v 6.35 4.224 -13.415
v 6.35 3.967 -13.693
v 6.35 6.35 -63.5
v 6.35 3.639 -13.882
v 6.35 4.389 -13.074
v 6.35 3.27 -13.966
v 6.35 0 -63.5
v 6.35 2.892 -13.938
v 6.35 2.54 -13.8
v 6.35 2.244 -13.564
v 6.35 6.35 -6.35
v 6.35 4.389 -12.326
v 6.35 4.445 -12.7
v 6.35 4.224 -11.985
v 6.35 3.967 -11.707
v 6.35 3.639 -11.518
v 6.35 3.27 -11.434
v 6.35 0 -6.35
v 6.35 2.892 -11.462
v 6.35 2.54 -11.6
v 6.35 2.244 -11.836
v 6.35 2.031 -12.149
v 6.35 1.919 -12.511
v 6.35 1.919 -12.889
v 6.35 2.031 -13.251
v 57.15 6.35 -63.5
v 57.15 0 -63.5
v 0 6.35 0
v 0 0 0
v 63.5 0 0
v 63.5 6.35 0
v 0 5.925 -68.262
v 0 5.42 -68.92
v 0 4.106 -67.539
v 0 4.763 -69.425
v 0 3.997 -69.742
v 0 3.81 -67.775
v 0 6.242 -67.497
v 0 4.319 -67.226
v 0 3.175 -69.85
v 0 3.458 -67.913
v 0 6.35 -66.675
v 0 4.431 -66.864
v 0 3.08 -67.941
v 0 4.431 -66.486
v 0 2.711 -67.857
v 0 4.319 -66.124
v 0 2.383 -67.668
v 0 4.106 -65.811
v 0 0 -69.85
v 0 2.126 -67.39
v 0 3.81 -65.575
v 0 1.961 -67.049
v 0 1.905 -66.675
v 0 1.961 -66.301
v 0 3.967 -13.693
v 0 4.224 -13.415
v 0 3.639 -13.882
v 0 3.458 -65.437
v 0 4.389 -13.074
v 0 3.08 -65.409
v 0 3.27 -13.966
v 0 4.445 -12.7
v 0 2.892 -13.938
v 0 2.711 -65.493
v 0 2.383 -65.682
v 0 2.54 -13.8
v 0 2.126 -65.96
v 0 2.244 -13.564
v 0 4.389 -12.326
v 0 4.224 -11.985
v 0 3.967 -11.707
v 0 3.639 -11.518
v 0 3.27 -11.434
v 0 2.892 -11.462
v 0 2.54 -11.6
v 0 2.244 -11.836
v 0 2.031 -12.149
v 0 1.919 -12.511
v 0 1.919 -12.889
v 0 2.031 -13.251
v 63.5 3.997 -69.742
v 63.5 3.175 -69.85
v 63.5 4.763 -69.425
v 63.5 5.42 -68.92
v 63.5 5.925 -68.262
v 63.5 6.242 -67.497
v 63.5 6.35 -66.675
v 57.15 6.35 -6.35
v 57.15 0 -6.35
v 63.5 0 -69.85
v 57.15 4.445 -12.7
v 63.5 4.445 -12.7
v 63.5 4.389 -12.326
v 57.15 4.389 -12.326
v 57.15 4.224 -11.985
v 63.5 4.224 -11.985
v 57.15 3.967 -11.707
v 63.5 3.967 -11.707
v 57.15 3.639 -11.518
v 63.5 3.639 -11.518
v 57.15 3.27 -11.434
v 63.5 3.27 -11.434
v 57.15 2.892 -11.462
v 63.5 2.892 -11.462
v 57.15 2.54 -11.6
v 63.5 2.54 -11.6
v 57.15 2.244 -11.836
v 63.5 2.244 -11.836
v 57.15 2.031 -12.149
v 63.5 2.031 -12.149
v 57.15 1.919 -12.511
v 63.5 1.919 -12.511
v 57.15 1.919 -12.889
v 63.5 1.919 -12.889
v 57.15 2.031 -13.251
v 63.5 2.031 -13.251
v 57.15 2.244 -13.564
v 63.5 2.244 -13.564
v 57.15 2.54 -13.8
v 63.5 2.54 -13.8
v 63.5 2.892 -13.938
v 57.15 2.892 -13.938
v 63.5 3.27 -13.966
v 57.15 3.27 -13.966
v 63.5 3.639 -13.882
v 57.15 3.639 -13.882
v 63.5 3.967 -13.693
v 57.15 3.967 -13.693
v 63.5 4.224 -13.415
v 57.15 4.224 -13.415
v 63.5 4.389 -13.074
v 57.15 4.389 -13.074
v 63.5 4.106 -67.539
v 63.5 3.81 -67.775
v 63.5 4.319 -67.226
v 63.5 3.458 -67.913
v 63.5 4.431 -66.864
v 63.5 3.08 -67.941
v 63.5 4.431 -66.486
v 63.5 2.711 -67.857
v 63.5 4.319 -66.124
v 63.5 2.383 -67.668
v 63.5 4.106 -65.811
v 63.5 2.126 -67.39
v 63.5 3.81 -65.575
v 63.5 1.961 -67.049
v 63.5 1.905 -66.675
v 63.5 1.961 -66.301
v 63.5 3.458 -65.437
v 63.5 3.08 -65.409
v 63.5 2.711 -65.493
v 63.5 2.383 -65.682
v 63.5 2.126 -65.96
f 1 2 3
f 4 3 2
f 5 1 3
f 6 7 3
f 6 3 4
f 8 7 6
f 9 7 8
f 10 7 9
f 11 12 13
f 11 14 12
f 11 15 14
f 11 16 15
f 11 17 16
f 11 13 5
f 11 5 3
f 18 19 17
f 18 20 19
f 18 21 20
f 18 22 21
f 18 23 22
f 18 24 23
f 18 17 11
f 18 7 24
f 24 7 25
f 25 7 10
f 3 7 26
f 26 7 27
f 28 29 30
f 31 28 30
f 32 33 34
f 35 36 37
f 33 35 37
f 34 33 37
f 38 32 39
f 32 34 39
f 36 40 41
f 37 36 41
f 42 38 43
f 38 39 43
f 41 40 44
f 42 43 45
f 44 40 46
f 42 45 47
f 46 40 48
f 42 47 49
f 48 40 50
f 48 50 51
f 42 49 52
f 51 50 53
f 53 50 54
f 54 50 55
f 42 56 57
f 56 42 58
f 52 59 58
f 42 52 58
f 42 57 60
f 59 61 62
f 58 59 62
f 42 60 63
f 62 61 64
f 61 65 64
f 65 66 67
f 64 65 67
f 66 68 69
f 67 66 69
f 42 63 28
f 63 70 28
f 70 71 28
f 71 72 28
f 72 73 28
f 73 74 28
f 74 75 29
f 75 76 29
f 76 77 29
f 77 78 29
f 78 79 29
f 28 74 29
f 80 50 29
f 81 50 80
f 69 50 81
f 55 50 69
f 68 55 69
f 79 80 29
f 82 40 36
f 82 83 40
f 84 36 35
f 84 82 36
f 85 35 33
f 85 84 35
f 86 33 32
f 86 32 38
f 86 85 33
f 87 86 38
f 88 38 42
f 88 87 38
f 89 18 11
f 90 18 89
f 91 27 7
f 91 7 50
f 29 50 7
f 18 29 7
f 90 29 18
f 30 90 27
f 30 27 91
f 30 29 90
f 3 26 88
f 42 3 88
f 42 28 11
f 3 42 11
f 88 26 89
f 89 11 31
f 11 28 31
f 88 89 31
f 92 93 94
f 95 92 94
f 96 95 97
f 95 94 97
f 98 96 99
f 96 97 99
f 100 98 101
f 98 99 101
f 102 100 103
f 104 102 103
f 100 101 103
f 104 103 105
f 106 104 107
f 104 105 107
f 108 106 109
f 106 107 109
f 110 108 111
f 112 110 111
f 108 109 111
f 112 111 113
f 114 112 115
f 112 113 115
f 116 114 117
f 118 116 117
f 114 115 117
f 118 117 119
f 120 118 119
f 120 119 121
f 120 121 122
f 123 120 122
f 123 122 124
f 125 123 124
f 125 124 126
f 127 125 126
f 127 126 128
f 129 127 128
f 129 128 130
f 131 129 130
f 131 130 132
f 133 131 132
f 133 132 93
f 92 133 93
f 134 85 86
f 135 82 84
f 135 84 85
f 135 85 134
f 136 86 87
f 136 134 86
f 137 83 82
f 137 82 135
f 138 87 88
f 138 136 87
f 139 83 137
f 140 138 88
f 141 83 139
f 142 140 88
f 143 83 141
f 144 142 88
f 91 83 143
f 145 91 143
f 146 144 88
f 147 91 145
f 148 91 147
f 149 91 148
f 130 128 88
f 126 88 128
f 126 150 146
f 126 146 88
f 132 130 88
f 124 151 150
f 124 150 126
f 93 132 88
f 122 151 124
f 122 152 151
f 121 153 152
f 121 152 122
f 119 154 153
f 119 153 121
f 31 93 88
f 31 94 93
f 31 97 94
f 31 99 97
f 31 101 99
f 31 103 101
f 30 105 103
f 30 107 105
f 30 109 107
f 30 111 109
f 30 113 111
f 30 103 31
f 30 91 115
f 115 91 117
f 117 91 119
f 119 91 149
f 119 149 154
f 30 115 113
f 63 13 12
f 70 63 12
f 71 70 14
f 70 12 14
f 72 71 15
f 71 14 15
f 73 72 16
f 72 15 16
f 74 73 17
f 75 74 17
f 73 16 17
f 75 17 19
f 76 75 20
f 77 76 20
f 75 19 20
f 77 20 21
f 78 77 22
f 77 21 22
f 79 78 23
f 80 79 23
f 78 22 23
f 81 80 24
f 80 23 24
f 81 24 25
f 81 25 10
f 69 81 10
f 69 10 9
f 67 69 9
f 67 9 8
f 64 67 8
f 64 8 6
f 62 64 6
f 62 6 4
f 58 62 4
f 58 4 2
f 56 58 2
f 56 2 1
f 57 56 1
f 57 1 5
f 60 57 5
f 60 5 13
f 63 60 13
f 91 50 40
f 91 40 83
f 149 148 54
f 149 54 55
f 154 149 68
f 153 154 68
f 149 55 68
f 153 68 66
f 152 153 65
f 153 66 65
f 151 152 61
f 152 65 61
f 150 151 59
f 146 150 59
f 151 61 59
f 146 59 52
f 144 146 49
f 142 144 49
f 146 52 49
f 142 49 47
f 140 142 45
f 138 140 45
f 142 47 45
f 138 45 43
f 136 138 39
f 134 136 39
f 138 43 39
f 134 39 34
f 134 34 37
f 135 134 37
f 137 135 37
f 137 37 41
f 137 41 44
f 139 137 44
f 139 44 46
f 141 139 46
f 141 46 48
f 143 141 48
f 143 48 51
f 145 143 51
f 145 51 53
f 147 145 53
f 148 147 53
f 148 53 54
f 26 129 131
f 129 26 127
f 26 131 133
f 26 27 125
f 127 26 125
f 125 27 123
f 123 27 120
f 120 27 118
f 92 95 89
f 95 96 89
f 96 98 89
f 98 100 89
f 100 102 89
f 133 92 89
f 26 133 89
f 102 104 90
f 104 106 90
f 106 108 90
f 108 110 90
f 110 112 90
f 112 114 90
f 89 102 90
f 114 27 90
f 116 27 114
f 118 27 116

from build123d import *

# Parameters (mm, degrees)
F0_W     = 63.5
F0_H     = 69.85
F0_W_2   = 50.8
F0_H_2   = 57.15
F1_DEPTH = 6.35
F2_R     = 1.27
F3_DEPTH = 63.501
F4_R     = 3.175
F5_R     = 1.27
F6_DEPTH = 63.501


with BuildPart() as f1:
    # F0 (on Front) → F1 (new body)
    with BuildSketch(Plane.XZ):
        with Locations((31.75, -34.925)):
            Rectangle(F0_W, F0_H)
        with Locations((31.75, -34.925)):
            Rectangle(F0_W_2, F0_H_2, mode=Mode.SUBTRACT)
    extrude(amount=-F1_DEPTH)

    # F2 (on face) → F3 (cut, through all)
    with BuildSketch(Plane(origin=(0, 0, 0), x_dir=(0, -1, 0), z_dir=(-1, 0, 0))):
        with Locations((-3.175, -66.675)):
            Circle(F2_R)
    extrude(amount=-F3_DEPTH, mode=Mode.SUBTRACT)

    # F4
    f4_edges = [f1.edges().sort_by_distance(p)[0] for p in [
        (31.75, 6.35, -69.85),
    ]]
    fillet(f4_edges, radius=F4_R)

    # F5 (on face) → F6 (cut, through all)
    with BuildSketch(Plane.YZ.offset(63.5)):
        with Locations((3.175, -12.7)):
            Circle(F5_R)
    extrude(amount=-F6_DEPTH, mode=Mode.SUBTRACT)


solid = f1.part
